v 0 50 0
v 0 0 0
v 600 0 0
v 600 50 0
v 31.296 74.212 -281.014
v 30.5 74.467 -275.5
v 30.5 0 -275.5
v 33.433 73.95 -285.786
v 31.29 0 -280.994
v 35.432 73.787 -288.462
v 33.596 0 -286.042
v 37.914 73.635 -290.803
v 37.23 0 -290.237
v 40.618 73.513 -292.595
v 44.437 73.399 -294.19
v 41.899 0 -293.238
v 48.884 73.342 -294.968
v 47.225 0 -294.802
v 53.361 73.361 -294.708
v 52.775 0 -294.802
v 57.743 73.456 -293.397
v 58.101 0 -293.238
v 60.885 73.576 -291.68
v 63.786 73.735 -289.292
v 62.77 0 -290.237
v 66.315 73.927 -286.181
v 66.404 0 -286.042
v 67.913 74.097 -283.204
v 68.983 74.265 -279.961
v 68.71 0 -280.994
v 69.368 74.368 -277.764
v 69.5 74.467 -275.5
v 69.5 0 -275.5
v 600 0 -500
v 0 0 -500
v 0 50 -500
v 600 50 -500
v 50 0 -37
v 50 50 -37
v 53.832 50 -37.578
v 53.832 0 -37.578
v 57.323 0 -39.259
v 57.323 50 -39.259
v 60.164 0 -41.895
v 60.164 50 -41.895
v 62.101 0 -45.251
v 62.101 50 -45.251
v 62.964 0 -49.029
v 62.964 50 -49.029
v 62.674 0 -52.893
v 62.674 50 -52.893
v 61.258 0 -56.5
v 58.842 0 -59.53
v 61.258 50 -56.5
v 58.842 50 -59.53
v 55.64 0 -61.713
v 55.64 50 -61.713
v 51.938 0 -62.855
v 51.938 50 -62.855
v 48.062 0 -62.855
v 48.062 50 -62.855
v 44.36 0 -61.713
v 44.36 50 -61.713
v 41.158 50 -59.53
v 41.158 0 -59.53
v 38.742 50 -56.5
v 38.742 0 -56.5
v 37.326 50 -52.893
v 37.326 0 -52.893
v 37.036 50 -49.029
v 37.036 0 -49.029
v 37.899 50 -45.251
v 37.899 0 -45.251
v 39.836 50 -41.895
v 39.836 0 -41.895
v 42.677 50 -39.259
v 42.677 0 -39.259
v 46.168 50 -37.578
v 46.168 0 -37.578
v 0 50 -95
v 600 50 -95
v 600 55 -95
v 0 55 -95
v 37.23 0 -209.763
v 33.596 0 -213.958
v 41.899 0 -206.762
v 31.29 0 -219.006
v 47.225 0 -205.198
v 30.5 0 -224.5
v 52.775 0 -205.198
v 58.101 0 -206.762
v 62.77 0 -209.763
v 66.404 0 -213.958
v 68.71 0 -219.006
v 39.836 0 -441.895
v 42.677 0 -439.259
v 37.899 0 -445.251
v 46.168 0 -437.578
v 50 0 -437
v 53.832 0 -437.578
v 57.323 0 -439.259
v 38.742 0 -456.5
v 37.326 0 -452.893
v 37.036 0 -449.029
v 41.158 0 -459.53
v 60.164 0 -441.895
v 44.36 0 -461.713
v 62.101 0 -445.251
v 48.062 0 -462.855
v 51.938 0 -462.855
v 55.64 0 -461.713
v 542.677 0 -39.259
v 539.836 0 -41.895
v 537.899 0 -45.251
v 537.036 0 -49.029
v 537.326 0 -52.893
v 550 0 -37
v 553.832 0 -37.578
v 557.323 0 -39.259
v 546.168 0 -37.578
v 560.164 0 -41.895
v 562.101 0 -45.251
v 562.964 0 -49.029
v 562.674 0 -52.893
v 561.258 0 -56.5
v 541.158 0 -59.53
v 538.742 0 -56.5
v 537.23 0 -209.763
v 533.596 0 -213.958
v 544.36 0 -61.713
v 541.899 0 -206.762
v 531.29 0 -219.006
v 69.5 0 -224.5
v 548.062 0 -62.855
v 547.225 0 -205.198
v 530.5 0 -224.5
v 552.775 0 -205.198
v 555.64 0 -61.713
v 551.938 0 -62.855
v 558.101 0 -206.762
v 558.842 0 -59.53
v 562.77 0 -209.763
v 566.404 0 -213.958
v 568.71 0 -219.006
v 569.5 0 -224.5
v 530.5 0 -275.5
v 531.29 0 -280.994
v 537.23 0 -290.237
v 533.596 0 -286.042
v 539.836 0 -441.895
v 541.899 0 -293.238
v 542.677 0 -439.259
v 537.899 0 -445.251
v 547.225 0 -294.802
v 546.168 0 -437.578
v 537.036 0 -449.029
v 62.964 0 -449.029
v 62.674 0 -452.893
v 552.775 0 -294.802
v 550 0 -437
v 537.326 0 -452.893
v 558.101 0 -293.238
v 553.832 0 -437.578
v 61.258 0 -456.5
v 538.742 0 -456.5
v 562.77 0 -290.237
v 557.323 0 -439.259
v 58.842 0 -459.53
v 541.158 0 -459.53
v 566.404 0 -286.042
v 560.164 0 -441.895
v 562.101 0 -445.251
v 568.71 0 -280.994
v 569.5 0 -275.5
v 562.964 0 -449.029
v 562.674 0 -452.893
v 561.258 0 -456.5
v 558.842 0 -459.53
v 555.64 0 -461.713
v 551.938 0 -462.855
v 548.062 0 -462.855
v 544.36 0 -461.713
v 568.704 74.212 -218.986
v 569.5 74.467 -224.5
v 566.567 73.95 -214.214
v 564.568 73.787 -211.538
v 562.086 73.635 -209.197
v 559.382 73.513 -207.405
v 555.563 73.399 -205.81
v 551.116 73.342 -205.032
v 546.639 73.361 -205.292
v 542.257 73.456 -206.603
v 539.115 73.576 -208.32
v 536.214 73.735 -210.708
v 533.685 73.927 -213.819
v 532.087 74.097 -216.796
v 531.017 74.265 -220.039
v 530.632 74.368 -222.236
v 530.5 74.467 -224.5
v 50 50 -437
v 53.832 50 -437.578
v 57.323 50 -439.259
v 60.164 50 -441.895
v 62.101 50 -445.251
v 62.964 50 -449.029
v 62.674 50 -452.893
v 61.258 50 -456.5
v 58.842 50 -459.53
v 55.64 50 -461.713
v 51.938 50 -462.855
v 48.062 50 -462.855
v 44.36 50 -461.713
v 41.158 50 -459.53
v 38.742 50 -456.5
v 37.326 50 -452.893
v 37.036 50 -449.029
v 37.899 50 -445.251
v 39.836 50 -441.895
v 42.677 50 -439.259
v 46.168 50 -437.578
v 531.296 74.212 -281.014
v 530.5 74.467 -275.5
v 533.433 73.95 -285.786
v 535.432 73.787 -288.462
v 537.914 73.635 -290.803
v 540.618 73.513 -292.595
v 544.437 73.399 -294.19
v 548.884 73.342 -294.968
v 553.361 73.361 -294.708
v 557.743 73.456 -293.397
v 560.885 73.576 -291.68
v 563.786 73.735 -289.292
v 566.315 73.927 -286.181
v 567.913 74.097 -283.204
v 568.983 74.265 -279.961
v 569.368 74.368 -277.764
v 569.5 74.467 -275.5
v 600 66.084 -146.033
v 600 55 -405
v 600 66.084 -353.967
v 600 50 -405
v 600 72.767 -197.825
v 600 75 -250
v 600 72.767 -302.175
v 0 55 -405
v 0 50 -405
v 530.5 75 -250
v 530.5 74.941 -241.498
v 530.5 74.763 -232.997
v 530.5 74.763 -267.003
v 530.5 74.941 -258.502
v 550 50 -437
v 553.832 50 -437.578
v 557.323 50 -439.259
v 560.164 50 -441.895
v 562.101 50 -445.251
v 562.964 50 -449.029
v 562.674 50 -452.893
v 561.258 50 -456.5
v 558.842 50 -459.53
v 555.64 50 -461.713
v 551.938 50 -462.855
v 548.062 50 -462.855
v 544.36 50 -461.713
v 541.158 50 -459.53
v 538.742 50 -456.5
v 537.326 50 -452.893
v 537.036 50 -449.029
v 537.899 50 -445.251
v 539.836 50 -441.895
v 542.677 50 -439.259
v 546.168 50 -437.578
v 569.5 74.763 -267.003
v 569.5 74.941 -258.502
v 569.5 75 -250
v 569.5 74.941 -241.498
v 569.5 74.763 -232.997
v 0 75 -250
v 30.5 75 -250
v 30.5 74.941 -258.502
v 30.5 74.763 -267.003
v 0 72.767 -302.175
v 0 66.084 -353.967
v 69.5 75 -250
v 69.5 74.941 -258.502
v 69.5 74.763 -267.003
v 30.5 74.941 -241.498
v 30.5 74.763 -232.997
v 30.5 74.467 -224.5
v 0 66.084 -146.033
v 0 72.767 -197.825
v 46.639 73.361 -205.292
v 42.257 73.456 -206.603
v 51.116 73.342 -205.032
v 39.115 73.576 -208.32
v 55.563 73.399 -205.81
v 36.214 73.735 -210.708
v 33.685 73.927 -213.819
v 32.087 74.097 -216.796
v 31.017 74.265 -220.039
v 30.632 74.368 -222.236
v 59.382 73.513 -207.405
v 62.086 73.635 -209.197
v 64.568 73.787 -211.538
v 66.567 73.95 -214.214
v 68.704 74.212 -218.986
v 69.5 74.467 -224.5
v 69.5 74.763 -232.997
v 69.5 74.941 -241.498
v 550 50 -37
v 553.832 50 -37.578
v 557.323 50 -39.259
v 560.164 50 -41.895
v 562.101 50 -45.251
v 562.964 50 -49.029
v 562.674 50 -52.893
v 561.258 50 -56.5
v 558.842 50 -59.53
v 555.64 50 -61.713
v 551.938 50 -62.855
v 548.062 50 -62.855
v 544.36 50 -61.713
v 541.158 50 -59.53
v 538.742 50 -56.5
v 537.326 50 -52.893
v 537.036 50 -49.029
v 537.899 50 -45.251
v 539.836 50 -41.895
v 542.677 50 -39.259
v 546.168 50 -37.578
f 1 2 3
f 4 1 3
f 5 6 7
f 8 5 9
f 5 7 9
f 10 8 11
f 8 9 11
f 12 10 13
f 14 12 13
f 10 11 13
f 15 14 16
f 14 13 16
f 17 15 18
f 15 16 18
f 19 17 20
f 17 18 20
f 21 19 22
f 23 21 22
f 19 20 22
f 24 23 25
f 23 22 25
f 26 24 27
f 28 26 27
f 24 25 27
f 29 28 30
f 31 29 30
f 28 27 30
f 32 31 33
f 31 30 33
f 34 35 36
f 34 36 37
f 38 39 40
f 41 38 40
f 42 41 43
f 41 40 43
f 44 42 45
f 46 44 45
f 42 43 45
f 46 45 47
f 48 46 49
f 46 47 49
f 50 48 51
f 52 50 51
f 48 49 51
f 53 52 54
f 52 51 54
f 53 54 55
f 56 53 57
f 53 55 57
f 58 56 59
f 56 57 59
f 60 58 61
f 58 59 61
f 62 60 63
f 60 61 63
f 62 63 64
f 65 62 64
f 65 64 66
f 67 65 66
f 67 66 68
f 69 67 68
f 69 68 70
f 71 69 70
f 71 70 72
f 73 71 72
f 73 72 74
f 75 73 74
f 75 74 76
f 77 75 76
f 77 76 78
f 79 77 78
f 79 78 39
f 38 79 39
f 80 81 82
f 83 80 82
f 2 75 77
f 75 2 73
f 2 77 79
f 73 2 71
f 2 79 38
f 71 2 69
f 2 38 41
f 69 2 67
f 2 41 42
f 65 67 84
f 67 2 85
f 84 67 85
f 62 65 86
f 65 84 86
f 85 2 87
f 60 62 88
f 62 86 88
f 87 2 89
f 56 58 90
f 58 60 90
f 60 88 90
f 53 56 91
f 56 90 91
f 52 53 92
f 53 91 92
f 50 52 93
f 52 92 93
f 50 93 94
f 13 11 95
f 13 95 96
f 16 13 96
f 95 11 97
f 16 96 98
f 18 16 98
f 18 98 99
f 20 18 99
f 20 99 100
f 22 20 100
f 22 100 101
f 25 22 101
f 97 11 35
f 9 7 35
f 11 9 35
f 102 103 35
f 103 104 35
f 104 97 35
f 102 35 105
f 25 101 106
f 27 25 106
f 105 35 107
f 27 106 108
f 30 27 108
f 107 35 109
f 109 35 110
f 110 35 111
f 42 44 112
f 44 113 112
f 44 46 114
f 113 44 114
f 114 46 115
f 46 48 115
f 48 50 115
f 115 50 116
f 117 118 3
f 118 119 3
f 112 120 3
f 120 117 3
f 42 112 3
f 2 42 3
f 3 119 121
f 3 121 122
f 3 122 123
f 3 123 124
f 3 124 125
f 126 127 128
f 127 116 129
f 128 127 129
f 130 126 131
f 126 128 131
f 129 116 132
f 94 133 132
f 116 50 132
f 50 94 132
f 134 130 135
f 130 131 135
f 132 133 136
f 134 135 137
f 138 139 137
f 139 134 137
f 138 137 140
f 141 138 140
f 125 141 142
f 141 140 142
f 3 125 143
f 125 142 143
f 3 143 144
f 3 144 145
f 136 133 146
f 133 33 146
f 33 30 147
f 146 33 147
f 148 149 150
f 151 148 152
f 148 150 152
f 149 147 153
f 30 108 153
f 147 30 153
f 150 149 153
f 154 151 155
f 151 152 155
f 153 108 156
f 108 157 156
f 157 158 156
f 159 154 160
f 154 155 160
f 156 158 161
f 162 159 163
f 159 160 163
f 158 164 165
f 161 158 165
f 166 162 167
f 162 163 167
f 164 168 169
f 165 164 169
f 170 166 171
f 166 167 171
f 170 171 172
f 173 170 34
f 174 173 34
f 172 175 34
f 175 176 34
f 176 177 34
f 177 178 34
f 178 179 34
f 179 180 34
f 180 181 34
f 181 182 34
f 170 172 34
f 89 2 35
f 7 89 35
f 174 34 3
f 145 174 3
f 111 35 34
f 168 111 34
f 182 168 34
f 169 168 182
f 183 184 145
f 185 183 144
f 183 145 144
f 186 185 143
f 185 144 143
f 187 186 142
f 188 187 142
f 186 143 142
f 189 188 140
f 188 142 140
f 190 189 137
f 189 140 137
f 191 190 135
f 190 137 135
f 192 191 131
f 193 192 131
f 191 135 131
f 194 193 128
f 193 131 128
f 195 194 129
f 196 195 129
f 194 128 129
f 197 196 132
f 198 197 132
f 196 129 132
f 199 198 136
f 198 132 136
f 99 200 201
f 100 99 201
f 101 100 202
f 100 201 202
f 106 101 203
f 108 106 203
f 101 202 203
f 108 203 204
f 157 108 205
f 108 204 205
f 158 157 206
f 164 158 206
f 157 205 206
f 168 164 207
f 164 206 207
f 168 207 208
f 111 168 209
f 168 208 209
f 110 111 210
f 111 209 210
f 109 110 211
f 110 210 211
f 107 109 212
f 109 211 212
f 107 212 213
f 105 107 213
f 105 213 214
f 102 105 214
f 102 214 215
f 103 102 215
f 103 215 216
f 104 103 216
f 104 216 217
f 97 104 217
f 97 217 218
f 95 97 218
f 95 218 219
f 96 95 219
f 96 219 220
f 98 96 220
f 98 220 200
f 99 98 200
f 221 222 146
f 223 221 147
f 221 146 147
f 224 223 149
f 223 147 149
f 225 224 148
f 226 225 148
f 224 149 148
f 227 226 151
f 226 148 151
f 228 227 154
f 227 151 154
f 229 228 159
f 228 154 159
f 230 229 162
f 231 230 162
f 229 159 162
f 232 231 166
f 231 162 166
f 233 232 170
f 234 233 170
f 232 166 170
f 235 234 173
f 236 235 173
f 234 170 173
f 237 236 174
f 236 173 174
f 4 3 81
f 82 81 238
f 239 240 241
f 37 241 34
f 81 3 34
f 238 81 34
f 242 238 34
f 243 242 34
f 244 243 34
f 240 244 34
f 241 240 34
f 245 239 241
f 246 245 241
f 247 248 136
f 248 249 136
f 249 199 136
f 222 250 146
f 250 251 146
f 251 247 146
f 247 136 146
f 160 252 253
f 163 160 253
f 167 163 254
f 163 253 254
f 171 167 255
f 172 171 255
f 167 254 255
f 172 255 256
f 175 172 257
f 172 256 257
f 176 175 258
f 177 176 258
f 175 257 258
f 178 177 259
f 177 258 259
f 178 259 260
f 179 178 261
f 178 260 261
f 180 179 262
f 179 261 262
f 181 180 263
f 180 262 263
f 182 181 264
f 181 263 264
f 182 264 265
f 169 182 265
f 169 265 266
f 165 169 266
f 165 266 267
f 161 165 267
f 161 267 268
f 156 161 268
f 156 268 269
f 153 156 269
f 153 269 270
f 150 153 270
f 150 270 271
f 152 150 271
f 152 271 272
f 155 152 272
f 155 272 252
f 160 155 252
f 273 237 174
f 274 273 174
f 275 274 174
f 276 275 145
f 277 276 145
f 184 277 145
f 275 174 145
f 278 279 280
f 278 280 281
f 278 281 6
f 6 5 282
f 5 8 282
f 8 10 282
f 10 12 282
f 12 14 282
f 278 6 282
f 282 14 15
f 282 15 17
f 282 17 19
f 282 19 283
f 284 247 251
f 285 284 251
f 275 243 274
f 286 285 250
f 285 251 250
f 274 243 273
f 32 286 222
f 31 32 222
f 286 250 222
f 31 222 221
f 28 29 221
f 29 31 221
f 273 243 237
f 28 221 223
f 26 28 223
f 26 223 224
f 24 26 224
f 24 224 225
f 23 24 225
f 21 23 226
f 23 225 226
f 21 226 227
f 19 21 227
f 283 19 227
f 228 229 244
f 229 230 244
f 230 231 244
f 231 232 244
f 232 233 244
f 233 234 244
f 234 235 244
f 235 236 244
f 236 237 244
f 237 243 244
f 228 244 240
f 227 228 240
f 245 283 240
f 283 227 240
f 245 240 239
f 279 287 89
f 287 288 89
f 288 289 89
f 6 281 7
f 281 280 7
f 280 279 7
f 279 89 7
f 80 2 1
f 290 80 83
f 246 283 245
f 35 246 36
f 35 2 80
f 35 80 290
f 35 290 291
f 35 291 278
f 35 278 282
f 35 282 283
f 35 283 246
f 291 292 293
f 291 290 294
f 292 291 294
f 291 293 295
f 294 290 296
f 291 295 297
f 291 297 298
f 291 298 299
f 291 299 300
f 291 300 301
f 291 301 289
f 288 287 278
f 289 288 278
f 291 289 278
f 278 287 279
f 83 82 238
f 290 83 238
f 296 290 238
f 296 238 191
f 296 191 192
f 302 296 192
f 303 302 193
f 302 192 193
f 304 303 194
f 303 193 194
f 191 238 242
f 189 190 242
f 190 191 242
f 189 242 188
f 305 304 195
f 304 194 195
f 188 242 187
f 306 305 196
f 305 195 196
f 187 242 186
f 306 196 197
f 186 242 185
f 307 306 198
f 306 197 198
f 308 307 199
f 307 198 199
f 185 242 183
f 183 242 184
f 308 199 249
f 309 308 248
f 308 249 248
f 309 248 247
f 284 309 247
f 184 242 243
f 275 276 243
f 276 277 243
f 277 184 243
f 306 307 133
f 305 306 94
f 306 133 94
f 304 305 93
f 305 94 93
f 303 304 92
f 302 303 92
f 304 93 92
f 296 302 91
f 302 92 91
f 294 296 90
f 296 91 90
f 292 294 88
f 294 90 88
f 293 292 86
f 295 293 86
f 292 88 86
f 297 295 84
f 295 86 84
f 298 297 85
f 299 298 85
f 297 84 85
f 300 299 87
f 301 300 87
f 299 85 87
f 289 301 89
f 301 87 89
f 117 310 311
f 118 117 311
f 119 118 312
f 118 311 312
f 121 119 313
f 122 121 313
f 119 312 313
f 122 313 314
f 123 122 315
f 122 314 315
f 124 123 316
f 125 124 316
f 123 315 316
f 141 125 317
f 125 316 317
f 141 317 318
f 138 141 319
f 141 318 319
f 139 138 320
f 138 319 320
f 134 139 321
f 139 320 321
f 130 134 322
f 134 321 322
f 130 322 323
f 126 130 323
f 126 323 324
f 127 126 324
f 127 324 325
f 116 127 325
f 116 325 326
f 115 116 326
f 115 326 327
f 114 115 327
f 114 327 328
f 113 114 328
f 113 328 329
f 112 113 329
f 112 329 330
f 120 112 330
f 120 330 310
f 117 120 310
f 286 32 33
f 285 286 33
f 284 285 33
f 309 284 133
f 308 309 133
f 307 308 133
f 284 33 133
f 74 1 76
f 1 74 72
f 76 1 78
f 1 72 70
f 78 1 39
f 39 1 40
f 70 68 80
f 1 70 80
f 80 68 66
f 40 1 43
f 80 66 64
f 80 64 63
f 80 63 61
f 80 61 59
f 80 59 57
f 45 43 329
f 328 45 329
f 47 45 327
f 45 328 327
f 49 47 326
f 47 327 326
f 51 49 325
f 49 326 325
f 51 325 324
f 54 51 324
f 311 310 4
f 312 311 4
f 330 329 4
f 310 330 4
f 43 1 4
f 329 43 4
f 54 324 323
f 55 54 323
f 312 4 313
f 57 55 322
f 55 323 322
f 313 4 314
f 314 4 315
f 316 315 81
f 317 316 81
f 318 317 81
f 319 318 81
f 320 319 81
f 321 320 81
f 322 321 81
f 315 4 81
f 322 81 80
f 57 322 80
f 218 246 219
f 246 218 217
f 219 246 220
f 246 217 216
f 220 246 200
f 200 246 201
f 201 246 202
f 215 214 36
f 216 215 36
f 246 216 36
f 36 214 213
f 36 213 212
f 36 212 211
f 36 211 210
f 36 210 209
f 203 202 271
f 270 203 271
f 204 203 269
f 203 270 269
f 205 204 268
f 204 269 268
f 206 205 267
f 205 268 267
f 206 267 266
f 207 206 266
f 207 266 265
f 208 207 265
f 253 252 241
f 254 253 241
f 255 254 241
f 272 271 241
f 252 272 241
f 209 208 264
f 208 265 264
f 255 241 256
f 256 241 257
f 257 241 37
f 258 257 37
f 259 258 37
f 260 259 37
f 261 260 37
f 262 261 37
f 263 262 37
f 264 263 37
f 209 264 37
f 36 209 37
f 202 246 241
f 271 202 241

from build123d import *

# Parameters (mm, degrees)
SKETCH_1_W             = 600
SKETCH_1_H             = 500
EXTRUDE_1_DEPTH        = 75
CUT_EXTRUDE_1_DEPTH    = 785.617741324
CUT_EXTRUDE_2_DEPTH    = 785.617741324
SKETCH_5_R             = 13
CUT_EXTRUDE_3_DEPTH    = 783.623792125
CUT_EXTRUDE_4_DEPTH    = 785.617741324
PATTERN_LINEAR_1_COUNT = 2
PATTERN_LINEAR_1_PITCH = 500


with BuildPart() as part:
    # 草图1 → 凸台-拉伸1 (new body)
    with BuildSketch(Plane(origin=(0, 0, 0), x_dir=(1, 0, 0), z_dir=(0, 1, 0))):
        with Locations((300, 250)):
            Rectangle(SKETCH_1_W, SKETCH_1_H)
    extrude(amount=EXTRUDE_1_DEPTH)

    # 草图3 → 切除-拉伸1 (cut, through all)
    with BuildSketch(Plane(origin=(600, 0, 0), x_dir=(0, 0, -1), z_dir=(1, 0, 0))):
        with BuildLine():
            Line((405, 55), (405, 50))
            Line((405, 50), (500, 50))
            Line((500, 50), (500, 75))
            Line((500, 75), (250, 75))
            ThreePointArc((250, 75), (328.14249804, 69.979359813), (405, 55))
        make_face()
    extrude(amount=-CUT_EXTRUDE_1_DEPTH, mode=Mode.SUBTRACT)

    # 草图4 → 切除-拉伸2 (cut, through all)
    with BuildSketch(Plane(origin=(600, 0, 0), x_dir=(0, 0, -1), z_dir=(1, 0, 0))):
        with BuildLine():
            Line((0, 75), (0, 50))
            Line((0, 50), (95, 50))
            Line((95, 50), (95, 55))
            ThreePointArc((95, 55), (171.85750196, 69.979359813), (250, 75))
            Line((250, 75), (0, 75))
        make_face()
    extrude(amount=-CUT_EXTRUDE_2_DEPTH, mode=Mode.SUBTRACT)

    # 草图5 → 切除-拉伸3 (cut, through all)
    with BuildSketch(Plane(origin=(0, 50, 0), x_dir=(1, 0, 0), z_dir=(0, 1, 0))):
        with Locations(Location((50, 450, 0), (0, 0, 270))):
            Circle(SKETCH_5_R)
        with Locations(Location((550, 450, 0), (0, 0, 270))):
            Circle(SKETCH_5_R)
        with Locations(Location((50, 50, 0), (0, 0, 270))):
            Circle(SKETCH_5_R)
        with Locations(Location((550, 50, 0), (0, 0, 270))):
            Circle(SKETCH_5_R)
    extrude(amount=-CUT_EXTRUDE_3_DEPTH, mode=Mode.SUBTRACT)

    # 草图6 → 切除-拉伸4 (cut, through all)
    with BuildSketch(Plane.XZ):
        with BuildLine():
            Line((30.5, -224.5), (30.5, -275.5))
            ThreePointArc((30.5, -275.5), (50, -295), (69.5, -275.5))
            Line((69.5, -275.5), (69.5, -224.5))
            ThreePointArc((69.5, -224.5), (50, -205), (30.5, -224.5))
        make_face()
    cut_extrude_4 = extrude(amount=-CUT_EXTRUDE_4_DEPTH, mode=Mode.SUBTRACT)

    # 阵列(线性)1: 切除-拉伸4 ×2
    with Locations(*[(i * PATTERN_LINEAR_1_PITCH, 0, 0) for i in range(1, PATTERN_LINEAR_1_COUNT)]):
        add(cut_extrude_4, mode=Mode.SUBTRACT)


solid = part.part
